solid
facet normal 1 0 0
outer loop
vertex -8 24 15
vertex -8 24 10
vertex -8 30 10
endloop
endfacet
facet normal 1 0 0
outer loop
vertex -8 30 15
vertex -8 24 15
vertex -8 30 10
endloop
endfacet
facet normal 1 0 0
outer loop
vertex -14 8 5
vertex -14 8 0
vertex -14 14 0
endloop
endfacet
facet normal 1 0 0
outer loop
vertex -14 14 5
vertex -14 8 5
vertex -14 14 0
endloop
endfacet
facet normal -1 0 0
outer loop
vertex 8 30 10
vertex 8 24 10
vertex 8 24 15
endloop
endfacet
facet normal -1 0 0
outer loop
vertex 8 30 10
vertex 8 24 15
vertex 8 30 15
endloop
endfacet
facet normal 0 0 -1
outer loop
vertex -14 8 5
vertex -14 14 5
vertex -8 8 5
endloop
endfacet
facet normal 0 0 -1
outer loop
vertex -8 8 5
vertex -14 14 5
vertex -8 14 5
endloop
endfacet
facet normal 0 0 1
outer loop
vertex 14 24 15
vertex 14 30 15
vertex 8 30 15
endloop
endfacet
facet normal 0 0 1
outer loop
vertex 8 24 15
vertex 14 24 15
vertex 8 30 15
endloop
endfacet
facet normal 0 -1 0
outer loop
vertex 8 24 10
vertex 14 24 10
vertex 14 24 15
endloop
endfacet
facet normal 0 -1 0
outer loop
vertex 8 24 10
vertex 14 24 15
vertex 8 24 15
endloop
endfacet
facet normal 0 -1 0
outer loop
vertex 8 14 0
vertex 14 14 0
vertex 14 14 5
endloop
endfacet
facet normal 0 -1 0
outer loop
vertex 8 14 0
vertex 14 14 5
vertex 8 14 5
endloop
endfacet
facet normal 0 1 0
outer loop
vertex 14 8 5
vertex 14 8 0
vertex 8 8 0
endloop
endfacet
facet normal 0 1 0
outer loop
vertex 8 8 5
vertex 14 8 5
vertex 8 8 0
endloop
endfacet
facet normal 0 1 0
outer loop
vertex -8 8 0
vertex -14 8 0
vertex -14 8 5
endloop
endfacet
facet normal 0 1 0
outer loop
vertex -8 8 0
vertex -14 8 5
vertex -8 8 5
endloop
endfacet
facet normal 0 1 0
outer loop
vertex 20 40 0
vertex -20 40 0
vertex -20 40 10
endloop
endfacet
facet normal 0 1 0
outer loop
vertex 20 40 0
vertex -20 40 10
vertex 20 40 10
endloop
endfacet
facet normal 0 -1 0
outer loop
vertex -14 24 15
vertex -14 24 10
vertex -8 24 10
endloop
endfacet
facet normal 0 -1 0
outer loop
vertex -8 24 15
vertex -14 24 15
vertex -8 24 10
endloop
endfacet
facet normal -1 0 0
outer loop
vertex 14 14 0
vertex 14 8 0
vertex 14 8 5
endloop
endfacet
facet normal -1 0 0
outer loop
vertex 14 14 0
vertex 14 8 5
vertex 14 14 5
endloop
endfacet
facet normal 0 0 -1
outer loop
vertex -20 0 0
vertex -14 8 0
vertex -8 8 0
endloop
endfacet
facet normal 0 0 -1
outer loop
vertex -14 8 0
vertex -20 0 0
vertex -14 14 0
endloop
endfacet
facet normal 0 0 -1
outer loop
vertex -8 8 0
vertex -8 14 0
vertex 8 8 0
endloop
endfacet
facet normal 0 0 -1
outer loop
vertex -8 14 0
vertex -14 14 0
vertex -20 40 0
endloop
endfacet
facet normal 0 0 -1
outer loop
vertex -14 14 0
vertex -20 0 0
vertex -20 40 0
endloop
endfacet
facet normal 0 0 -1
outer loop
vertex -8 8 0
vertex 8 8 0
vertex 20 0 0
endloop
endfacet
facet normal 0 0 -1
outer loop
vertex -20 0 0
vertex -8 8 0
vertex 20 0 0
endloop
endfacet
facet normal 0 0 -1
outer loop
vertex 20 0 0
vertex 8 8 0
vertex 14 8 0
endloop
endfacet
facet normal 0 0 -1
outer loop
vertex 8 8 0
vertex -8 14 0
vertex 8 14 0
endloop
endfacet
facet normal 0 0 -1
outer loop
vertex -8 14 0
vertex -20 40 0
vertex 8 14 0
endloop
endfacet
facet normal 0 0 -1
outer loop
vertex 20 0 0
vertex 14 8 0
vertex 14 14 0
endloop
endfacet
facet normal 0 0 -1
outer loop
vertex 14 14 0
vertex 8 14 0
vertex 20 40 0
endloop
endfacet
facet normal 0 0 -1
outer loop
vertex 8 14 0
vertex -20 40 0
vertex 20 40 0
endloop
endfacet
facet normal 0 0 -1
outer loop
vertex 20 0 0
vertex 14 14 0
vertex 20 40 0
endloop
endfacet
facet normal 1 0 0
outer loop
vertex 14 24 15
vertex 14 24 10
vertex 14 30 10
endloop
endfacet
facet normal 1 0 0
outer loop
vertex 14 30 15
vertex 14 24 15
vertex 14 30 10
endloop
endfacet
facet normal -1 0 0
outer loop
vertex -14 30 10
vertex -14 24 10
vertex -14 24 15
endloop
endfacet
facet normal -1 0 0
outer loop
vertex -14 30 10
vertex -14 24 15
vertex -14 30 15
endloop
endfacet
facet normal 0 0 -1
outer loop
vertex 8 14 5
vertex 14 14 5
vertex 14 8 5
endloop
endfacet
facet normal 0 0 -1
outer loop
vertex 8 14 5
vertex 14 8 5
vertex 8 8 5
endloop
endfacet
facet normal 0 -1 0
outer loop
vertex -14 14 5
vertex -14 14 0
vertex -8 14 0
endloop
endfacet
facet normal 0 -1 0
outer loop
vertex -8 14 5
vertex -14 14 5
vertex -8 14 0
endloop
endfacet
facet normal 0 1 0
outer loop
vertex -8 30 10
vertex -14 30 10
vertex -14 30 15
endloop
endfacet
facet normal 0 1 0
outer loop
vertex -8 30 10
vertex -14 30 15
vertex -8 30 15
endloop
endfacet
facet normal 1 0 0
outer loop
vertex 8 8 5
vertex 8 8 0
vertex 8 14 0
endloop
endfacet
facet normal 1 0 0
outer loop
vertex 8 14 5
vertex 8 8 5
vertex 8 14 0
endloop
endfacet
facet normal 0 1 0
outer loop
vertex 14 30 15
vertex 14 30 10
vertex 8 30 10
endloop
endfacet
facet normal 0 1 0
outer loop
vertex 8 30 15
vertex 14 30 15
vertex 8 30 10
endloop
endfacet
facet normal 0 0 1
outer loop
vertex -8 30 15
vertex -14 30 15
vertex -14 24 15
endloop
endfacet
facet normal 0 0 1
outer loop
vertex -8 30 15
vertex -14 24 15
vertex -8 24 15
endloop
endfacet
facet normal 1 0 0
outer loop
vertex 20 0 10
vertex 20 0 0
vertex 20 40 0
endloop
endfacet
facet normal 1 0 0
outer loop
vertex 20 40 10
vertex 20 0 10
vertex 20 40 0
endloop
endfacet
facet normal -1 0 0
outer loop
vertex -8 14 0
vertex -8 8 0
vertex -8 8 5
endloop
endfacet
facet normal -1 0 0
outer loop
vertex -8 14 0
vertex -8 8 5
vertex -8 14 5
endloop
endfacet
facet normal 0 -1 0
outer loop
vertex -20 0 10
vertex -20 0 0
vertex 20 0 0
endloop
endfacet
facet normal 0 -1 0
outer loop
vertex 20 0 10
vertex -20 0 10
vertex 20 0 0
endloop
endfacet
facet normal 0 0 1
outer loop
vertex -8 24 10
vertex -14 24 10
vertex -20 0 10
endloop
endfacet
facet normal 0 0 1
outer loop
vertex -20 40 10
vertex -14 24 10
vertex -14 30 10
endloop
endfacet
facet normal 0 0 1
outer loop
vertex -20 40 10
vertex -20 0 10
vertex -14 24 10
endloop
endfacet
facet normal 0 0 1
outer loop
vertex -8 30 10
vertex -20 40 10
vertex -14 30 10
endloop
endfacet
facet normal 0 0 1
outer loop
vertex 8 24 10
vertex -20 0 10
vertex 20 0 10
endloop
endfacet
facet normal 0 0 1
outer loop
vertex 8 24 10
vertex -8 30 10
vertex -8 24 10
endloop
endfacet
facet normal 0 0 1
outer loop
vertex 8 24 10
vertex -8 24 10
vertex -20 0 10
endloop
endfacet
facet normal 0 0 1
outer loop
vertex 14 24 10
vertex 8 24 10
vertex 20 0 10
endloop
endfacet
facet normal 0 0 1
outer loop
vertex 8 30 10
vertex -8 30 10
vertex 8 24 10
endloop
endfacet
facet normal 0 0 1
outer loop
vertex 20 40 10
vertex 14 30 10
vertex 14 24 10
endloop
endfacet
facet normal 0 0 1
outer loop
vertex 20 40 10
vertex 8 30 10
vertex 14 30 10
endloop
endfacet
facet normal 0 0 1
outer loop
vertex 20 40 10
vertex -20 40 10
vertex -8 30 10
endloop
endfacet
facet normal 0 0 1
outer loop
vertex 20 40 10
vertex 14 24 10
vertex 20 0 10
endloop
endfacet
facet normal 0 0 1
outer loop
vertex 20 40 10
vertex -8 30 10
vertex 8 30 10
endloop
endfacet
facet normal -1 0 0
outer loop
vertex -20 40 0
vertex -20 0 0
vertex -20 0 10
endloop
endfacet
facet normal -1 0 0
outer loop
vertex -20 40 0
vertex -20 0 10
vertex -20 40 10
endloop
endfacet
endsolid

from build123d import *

# Parameters (mm, degrees)
SKETCH1_W           = 40
SKETCH1_H           = 40
BOSS_EXTRUDE1_DEPTH = 10
SKETCH2_W           = 6
SKETCH2_H           = 6
CUT_EXTRUDE1_DEPTH  = 5
SKETCH3_W           = 6
SKETCH3_H           = 6
BOSS_EXTRUDE2_DEPTH = 5


with BuildPart() as part:
    # Sketch1 → Boss-Extrude1 (new body)
    with BuildSketch(Plane.XY):
        with Locations((0, 20)):
            Rectangle(SKETCH1_W, SKETCH1_H)
    extrude(amount=BOSS_EXTRUDE1_DEPTH)

    # Sketch2 → Cut-Extrude1 (cut)
    with BuildSketch(Plane.XY):
        with Locations((-11, 11)):
            Rectangle(SKETCH2_W, SKETCH2_H)
    cut_extrude1 = extrude(amount=CUT_EXTRUDE1_DEPTH, mode=Mode.SUBTRACT)

    # Sketch3 → Boss-Extrude2 (add)
    with BuildSketch(Plane.XY.offset(10)):
        with Locations((-11, 27)):
            Rectangle(SKETCH3_W, SKETCH3_H)
    boss_extrude2 = extrude(amount=BOSS_EXTRUDE2_DEPTH)

    # Mirror1: Cut-Extrude1, Boss-Extrude2 across plane
    add(cut_extrude1.mirror(Plane(origin=(0, 0, 0), x_dir=(0, 0, 1), z_dir=(1, 0, 0))), mode=Mode.SUBTRACT)
    add(boss_extrude2.mirror(Plane(origin=(0, 0, 0), x_dir=(0, 0, 1), z_dir=(1, 0, 0))))


solid = part.part
